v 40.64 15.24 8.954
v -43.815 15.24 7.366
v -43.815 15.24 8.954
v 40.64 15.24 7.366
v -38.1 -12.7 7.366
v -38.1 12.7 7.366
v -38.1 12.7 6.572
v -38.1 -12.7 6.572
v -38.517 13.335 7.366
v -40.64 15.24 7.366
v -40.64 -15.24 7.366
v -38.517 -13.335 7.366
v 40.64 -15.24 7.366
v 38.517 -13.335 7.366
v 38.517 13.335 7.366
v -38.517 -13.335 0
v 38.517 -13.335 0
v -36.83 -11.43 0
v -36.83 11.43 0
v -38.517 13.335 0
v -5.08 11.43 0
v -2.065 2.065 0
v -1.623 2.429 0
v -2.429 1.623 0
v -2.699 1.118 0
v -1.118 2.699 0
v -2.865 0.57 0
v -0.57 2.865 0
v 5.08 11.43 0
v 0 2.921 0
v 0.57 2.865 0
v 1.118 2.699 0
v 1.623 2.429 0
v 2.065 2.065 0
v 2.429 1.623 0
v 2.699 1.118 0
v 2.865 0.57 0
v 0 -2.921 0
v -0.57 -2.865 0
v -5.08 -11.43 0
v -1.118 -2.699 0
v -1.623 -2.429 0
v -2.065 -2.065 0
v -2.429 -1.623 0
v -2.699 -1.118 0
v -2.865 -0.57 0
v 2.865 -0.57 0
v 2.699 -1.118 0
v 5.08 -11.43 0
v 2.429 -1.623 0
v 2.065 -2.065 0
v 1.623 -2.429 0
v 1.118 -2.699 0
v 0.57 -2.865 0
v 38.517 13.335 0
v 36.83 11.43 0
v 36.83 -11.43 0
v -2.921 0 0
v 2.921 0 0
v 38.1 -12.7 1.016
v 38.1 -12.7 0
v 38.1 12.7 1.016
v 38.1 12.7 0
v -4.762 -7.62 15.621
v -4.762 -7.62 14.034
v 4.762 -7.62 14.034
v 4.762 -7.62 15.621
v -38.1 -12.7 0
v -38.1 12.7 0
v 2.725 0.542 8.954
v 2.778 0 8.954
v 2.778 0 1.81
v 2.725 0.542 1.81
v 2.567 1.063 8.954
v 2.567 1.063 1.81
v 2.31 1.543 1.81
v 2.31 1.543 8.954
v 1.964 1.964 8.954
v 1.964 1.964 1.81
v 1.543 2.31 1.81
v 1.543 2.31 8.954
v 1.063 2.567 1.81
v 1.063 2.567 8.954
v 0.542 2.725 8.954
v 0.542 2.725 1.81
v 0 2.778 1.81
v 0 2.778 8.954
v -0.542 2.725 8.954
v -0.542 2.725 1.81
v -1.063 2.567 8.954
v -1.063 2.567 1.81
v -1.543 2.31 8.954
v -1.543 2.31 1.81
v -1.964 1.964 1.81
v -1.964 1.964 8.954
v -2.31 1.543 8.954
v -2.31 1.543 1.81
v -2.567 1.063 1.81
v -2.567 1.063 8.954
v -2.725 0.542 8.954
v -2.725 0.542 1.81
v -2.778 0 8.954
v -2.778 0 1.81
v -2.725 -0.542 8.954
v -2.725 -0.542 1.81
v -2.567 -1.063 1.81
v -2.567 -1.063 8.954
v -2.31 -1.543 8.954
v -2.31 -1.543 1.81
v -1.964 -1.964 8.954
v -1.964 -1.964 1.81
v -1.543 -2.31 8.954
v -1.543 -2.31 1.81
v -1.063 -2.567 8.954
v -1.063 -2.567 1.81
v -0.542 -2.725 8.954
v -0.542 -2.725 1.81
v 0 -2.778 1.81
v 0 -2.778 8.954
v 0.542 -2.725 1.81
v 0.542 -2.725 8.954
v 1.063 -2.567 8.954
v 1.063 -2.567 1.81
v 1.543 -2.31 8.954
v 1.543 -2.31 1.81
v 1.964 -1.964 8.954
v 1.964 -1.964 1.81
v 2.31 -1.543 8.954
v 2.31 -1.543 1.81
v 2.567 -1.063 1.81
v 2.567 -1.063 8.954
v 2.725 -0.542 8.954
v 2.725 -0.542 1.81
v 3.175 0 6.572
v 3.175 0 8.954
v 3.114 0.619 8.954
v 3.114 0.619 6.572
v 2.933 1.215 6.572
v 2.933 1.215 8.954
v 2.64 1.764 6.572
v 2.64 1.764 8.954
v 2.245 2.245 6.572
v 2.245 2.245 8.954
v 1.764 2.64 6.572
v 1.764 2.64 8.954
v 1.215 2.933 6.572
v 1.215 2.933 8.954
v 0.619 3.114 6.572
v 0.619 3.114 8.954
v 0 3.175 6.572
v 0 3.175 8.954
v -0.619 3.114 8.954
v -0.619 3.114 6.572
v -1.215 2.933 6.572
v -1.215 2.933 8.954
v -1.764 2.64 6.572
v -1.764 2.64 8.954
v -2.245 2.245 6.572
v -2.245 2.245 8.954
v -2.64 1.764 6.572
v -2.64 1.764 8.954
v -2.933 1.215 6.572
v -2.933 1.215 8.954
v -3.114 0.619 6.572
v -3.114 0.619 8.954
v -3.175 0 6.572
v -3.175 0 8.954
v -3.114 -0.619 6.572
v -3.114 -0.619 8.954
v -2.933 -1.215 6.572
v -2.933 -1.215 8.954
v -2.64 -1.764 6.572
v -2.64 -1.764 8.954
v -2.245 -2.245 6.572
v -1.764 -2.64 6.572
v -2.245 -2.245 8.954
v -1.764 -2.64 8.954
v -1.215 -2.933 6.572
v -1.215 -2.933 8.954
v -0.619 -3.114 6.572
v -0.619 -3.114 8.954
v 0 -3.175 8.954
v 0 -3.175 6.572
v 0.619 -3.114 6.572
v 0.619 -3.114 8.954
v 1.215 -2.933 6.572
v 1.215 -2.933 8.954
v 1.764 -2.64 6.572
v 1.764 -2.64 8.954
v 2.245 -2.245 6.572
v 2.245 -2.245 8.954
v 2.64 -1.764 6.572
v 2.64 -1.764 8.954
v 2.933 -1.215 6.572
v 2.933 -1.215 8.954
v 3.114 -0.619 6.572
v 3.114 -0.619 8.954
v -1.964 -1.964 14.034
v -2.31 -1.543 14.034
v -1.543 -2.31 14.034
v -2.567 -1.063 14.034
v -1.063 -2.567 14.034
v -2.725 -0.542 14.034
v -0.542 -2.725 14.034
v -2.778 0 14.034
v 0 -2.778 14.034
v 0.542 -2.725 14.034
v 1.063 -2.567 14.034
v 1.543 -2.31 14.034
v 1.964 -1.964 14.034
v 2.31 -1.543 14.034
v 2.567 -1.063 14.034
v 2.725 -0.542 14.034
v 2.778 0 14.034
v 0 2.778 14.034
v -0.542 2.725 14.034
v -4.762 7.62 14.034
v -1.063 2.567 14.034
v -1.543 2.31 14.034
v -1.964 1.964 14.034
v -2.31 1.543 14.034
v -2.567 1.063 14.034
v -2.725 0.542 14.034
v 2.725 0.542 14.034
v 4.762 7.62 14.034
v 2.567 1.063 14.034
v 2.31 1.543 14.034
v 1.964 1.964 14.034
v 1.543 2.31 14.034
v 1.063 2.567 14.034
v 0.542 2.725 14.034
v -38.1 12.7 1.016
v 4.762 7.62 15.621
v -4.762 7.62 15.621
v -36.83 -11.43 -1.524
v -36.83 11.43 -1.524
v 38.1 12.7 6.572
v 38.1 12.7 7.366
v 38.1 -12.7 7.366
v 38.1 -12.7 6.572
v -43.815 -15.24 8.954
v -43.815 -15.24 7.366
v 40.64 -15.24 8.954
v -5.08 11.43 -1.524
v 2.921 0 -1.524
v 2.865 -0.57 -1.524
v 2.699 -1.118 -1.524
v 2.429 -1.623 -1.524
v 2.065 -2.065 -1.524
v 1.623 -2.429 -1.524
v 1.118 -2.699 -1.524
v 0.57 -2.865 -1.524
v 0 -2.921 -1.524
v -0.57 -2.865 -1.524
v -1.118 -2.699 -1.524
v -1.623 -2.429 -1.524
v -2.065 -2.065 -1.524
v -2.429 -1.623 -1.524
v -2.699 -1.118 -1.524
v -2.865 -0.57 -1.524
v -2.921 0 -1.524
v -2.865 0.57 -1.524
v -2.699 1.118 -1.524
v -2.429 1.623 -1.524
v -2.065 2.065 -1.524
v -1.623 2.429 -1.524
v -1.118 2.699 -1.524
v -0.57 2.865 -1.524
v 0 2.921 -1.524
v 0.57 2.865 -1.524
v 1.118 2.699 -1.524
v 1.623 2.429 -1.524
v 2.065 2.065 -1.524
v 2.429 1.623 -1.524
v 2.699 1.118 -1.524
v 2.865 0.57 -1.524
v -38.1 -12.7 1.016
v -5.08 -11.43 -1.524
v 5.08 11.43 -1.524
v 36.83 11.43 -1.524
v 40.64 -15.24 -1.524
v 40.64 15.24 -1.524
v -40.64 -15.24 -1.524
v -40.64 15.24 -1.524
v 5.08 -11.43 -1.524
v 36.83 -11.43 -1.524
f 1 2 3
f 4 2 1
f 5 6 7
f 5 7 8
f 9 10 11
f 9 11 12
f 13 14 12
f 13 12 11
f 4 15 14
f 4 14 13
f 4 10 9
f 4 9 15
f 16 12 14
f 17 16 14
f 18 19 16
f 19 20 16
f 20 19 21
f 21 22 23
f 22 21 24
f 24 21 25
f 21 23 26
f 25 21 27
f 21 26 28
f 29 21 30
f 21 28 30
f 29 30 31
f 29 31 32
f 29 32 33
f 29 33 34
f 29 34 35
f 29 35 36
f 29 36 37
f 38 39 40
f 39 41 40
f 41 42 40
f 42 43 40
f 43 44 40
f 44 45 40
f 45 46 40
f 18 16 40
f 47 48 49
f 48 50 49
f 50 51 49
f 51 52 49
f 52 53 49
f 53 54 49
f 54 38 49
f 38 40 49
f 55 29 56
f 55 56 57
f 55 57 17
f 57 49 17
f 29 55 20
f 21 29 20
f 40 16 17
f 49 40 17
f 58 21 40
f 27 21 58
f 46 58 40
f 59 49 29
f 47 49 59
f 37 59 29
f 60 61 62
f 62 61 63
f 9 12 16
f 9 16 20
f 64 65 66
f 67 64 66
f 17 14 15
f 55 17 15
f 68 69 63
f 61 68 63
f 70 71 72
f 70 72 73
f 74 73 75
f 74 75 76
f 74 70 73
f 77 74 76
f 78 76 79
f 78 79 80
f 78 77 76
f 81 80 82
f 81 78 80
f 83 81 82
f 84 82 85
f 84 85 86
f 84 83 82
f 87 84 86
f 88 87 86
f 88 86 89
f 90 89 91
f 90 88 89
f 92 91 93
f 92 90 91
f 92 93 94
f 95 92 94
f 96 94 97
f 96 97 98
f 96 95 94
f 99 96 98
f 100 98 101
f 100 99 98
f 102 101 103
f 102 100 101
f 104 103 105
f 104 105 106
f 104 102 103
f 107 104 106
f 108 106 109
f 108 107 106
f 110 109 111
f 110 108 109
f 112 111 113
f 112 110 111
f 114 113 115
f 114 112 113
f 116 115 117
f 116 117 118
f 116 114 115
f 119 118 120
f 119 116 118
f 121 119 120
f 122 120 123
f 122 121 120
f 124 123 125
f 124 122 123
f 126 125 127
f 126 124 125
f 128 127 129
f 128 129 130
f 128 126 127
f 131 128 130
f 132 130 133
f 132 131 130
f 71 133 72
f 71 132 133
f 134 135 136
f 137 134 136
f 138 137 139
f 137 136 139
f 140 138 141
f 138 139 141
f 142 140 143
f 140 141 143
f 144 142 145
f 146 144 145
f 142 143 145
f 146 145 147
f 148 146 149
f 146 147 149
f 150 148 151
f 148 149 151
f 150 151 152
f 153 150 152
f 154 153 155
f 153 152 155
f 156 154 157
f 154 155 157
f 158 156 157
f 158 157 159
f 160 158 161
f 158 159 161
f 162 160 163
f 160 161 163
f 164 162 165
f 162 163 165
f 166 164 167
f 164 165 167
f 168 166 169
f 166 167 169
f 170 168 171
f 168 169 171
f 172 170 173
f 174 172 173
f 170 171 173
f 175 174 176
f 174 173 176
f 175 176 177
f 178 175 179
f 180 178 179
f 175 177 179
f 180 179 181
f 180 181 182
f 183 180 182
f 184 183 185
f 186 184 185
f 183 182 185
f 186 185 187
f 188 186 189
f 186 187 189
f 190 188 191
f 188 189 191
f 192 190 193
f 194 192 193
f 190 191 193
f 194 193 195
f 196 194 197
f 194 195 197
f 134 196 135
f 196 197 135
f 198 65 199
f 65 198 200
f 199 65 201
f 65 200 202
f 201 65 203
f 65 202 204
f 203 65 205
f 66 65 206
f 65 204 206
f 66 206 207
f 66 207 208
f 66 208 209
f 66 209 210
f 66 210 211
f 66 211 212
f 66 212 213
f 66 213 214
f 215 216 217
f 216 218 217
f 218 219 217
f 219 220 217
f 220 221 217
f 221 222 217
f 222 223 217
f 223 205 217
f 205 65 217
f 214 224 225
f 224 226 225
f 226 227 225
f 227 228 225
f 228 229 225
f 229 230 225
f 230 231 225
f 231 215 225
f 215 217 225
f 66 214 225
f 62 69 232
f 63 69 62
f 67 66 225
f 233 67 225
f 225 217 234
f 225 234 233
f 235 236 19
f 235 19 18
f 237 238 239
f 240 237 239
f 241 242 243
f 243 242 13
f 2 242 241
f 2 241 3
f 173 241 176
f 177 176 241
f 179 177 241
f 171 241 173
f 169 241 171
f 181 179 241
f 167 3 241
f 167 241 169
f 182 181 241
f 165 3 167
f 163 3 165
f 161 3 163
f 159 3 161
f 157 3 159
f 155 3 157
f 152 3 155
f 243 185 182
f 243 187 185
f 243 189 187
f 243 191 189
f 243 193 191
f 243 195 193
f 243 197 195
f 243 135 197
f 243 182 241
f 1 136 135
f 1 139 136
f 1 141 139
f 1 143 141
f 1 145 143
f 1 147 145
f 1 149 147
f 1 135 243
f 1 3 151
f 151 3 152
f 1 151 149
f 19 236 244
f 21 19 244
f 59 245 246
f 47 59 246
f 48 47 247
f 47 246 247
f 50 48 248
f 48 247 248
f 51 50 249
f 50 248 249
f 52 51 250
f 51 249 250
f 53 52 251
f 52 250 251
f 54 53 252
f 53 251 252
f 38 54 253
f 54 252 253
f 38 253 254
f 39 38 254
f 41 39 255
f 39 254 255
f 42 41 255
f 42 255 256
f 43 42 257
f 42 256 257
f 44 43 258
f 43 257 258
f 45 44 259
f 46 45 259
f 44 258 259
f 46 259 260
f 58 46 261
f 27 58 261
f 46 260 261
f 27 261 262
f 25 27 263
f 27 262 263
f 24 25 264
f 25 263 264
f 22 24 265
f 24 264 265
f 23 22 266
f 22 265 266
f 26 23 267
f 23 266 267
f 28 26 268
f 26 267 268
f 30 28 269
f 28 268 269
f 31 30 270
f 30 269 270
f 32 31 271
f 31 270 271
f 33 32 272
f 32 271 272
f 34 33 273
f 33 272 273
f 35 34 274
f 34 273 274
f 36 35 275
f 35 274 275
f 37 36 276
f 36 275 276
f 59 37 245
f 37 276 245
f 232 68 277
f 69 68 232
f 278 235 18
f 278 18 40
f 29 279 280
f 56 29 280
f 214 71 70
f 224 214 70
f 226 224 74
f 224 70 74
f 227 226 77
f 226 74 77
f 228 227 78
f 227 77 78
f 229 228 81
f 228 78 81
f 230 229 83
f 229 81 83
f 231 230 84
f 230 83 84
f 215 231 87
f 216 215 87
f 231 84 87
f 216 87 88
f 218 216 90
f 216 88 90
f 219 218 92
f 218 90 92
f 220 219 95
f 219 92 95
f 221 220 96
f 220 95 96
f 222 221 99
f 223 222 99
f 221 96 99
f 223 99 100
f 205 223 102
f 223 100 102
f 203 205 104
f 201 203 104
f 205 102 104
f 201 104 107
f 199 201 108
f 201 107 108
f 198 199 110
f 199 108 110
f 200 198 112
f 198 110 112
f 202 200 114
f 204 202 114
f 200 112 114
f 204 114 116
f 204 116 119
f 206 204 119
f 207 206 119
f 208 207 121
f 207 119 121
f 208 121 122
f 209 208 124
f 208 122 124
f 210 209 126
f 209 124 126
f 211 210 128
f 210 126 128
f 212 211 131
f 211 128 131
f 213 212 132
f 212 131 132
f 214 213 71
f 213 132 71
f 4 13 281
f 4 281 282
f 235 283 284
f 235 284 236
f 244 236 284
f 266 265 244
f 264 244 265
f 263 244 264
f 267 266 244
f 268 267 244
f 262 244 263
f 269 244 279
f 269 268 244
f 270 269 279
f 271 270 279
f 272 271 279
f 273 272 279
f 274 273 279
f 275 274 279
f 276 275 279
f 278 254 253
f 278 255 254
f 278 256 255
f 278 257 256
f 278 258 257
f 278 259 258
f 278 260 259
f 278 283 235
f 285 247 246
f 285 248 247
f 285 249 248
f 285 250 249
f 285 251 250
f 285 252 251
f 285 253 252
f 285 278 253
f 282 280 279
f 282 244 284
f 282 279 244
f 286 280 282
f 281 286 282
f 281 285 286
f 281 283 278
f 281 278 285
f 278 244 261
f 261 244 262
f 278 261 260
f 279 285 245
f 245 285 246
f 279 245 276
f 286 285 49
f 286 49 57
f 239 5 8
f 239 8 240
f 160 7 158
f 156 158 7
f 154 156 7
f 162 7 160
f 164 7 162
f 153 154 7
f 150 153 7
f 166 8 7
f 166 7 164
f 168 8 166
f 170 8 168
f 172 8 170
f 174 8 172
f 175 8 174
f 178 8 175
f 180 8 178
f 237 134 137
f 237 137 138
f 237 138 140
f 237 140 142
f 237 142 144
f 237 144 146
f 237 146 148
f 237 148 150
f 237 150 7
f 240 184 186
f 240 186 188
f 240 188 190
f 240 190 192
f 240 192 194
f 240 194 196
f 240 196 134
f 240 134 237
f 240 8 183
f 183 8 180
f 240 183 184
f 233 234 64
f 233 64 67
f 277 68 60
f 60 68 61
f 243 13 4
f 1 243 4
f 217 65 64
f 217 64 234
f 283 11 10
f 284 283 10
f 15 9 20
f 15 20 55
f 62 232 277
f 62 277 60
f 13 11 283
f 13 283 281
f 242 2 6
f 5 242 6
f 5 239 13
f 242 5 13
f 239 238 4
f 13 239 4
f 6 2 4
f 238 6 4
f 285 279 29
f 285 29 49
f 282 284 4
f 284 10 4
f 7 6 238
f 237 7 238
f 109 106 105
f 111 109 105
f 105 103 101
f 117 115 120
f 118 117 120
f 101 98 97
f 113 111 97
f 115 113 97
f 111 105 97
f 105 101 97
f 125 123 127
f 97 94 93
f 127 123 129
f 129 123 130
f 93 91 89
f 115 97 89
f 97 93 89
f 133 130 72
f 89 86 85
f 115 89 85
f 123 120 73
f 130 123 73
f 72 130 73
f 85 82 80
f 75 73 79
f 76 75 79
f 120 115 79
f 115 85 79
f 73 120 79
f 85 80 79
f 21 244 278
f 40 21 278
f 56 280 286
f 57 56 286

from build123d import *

# Parameters (mm, degrees)
F0_W           = 76.2
F0_H           = 25.4
F1_DEPTH       = 1.016
F2_W           = 81.28
F2_H           = 30.48
F2_W_2         = 77.03312
F2_H_2         = 26.67
F3_DEPTH       = 6.35
F3_DEPTH_BACK  = 2.54
F4_W           = 77.03312
F4_H           = 26.67
F5_DEPTH       = 1.524
F6_W           = 84.455
F6_H           = 30.48
F7_DEPTH       = 1.5875
F8_W           = 76.2
F8_H           = 25.4
F9_DEPTH       = 0.79375
F10_R          = 3.175
F11_DEPTH      = 2.38125
F12_R          = 2.778125
F13_DEPTH      = 7.14375
F13_DEPTH_BACK = 5.08
F14_W          = 9.525
F14_H          = 15.24
F15_DEPTH      = 1.5875
F16_W          = 31.75
F16_H          = 22.86
F16_R          = 2.921
F17_DEPTH      = 1.524


with BuildPart() as f1:
    # F0 (on Top) → F1 (new body)
    with BuildSketch(Plane.XY):
        Rectangle(F0_W, F0_H)
    extrude(amount=F1_DEPTH)


with BuildPart() as f3:
    # F2 (on face) → F3 (new body, two sides)
    with BuildSketch(Plane.XY.offset(1.016)) as f3_sk:
        Rectangle(F2_W, F2_H)
        Rectangle(F2_W_2, F2_H_2, mode=Mode.SUBTRACT)
    extrude(amount=F3_DEPTH)
    extrude(f3_sk.sketch, amount=-F3_DEPTH_BACK)

    # F4 (on face) → F5 (join, through all)
    with BuildSketch(Plane(origin=(0, 0, -1.524), x_dir=(1, 0, 0), z_dir=(0, 0, -1))):
        Rectangle(F4_W, F4_H)
    extrude(amount=-F5_DEPTH)

    # F16 (on face) → F17 (cut, through all)
    with BuildSketch(Plane(origin=(0, 0, -1.524), x_dir=(1, 0, 0), z_dir=(0, 0, -1))):
        with Locations((20.955, 0)):
            Rectangle(F16_W, F16_H)
        with Locations((-20.955, 0)):
            Rectangle(F16_W, F16_H)
        Circle(F16_R)
    extrude(amount=-F17_DEPTH, mode=Mode.SUBTRACT)


with BuildPart() as f7:
    # F6 (on face) → F7 (new body)
    with BuildSketch(Plane.XY.offset(7.366)):
        with Locations((-1.5875, 0)):
            Rectangle(F6_W, F6_H)
    extrude(amount=F7_DEPTH)

    # F8 (on face) → F9 (join)
    with BuildSketch(Plane(origin=(0, 0, 7.366), x_dir=(1, 0, 0), z_dir=(0, 0, -1))):
        Rectangle(F8_W, F8_H)
    extrude(amount=F9_DEPTH)

    # F10 (on face) → F11 (cut, through all)
    with BuildSketch(Plane.XY.offset(8.9535)):
        Circle(F10_R)
    extrude(amount=-F11_DEPTH, mode=Mode.SUBTRACT)


with BuildPart() as f13:
    # F12 (on face) → F13 (new body, two sides)
    with BuildSketch(Plane.XY.offset(8.9535)) as f13_sk:
        Circle(F12_R)
    extrude(amount=-F13_DEPTH)
    extrude(f13_sk.sketch, amount=F13_DEPTH_BACK)

    # F14 (on face) → F15 (join)
    with BuildSketch(Plane.XY.offset(14.0335)):
        Rectangle(F14_W, F14_H)
    extrude(amount=F15_DEPTH)


solid = Compound([f1.part, f3.part, f7.part, f13.part])
